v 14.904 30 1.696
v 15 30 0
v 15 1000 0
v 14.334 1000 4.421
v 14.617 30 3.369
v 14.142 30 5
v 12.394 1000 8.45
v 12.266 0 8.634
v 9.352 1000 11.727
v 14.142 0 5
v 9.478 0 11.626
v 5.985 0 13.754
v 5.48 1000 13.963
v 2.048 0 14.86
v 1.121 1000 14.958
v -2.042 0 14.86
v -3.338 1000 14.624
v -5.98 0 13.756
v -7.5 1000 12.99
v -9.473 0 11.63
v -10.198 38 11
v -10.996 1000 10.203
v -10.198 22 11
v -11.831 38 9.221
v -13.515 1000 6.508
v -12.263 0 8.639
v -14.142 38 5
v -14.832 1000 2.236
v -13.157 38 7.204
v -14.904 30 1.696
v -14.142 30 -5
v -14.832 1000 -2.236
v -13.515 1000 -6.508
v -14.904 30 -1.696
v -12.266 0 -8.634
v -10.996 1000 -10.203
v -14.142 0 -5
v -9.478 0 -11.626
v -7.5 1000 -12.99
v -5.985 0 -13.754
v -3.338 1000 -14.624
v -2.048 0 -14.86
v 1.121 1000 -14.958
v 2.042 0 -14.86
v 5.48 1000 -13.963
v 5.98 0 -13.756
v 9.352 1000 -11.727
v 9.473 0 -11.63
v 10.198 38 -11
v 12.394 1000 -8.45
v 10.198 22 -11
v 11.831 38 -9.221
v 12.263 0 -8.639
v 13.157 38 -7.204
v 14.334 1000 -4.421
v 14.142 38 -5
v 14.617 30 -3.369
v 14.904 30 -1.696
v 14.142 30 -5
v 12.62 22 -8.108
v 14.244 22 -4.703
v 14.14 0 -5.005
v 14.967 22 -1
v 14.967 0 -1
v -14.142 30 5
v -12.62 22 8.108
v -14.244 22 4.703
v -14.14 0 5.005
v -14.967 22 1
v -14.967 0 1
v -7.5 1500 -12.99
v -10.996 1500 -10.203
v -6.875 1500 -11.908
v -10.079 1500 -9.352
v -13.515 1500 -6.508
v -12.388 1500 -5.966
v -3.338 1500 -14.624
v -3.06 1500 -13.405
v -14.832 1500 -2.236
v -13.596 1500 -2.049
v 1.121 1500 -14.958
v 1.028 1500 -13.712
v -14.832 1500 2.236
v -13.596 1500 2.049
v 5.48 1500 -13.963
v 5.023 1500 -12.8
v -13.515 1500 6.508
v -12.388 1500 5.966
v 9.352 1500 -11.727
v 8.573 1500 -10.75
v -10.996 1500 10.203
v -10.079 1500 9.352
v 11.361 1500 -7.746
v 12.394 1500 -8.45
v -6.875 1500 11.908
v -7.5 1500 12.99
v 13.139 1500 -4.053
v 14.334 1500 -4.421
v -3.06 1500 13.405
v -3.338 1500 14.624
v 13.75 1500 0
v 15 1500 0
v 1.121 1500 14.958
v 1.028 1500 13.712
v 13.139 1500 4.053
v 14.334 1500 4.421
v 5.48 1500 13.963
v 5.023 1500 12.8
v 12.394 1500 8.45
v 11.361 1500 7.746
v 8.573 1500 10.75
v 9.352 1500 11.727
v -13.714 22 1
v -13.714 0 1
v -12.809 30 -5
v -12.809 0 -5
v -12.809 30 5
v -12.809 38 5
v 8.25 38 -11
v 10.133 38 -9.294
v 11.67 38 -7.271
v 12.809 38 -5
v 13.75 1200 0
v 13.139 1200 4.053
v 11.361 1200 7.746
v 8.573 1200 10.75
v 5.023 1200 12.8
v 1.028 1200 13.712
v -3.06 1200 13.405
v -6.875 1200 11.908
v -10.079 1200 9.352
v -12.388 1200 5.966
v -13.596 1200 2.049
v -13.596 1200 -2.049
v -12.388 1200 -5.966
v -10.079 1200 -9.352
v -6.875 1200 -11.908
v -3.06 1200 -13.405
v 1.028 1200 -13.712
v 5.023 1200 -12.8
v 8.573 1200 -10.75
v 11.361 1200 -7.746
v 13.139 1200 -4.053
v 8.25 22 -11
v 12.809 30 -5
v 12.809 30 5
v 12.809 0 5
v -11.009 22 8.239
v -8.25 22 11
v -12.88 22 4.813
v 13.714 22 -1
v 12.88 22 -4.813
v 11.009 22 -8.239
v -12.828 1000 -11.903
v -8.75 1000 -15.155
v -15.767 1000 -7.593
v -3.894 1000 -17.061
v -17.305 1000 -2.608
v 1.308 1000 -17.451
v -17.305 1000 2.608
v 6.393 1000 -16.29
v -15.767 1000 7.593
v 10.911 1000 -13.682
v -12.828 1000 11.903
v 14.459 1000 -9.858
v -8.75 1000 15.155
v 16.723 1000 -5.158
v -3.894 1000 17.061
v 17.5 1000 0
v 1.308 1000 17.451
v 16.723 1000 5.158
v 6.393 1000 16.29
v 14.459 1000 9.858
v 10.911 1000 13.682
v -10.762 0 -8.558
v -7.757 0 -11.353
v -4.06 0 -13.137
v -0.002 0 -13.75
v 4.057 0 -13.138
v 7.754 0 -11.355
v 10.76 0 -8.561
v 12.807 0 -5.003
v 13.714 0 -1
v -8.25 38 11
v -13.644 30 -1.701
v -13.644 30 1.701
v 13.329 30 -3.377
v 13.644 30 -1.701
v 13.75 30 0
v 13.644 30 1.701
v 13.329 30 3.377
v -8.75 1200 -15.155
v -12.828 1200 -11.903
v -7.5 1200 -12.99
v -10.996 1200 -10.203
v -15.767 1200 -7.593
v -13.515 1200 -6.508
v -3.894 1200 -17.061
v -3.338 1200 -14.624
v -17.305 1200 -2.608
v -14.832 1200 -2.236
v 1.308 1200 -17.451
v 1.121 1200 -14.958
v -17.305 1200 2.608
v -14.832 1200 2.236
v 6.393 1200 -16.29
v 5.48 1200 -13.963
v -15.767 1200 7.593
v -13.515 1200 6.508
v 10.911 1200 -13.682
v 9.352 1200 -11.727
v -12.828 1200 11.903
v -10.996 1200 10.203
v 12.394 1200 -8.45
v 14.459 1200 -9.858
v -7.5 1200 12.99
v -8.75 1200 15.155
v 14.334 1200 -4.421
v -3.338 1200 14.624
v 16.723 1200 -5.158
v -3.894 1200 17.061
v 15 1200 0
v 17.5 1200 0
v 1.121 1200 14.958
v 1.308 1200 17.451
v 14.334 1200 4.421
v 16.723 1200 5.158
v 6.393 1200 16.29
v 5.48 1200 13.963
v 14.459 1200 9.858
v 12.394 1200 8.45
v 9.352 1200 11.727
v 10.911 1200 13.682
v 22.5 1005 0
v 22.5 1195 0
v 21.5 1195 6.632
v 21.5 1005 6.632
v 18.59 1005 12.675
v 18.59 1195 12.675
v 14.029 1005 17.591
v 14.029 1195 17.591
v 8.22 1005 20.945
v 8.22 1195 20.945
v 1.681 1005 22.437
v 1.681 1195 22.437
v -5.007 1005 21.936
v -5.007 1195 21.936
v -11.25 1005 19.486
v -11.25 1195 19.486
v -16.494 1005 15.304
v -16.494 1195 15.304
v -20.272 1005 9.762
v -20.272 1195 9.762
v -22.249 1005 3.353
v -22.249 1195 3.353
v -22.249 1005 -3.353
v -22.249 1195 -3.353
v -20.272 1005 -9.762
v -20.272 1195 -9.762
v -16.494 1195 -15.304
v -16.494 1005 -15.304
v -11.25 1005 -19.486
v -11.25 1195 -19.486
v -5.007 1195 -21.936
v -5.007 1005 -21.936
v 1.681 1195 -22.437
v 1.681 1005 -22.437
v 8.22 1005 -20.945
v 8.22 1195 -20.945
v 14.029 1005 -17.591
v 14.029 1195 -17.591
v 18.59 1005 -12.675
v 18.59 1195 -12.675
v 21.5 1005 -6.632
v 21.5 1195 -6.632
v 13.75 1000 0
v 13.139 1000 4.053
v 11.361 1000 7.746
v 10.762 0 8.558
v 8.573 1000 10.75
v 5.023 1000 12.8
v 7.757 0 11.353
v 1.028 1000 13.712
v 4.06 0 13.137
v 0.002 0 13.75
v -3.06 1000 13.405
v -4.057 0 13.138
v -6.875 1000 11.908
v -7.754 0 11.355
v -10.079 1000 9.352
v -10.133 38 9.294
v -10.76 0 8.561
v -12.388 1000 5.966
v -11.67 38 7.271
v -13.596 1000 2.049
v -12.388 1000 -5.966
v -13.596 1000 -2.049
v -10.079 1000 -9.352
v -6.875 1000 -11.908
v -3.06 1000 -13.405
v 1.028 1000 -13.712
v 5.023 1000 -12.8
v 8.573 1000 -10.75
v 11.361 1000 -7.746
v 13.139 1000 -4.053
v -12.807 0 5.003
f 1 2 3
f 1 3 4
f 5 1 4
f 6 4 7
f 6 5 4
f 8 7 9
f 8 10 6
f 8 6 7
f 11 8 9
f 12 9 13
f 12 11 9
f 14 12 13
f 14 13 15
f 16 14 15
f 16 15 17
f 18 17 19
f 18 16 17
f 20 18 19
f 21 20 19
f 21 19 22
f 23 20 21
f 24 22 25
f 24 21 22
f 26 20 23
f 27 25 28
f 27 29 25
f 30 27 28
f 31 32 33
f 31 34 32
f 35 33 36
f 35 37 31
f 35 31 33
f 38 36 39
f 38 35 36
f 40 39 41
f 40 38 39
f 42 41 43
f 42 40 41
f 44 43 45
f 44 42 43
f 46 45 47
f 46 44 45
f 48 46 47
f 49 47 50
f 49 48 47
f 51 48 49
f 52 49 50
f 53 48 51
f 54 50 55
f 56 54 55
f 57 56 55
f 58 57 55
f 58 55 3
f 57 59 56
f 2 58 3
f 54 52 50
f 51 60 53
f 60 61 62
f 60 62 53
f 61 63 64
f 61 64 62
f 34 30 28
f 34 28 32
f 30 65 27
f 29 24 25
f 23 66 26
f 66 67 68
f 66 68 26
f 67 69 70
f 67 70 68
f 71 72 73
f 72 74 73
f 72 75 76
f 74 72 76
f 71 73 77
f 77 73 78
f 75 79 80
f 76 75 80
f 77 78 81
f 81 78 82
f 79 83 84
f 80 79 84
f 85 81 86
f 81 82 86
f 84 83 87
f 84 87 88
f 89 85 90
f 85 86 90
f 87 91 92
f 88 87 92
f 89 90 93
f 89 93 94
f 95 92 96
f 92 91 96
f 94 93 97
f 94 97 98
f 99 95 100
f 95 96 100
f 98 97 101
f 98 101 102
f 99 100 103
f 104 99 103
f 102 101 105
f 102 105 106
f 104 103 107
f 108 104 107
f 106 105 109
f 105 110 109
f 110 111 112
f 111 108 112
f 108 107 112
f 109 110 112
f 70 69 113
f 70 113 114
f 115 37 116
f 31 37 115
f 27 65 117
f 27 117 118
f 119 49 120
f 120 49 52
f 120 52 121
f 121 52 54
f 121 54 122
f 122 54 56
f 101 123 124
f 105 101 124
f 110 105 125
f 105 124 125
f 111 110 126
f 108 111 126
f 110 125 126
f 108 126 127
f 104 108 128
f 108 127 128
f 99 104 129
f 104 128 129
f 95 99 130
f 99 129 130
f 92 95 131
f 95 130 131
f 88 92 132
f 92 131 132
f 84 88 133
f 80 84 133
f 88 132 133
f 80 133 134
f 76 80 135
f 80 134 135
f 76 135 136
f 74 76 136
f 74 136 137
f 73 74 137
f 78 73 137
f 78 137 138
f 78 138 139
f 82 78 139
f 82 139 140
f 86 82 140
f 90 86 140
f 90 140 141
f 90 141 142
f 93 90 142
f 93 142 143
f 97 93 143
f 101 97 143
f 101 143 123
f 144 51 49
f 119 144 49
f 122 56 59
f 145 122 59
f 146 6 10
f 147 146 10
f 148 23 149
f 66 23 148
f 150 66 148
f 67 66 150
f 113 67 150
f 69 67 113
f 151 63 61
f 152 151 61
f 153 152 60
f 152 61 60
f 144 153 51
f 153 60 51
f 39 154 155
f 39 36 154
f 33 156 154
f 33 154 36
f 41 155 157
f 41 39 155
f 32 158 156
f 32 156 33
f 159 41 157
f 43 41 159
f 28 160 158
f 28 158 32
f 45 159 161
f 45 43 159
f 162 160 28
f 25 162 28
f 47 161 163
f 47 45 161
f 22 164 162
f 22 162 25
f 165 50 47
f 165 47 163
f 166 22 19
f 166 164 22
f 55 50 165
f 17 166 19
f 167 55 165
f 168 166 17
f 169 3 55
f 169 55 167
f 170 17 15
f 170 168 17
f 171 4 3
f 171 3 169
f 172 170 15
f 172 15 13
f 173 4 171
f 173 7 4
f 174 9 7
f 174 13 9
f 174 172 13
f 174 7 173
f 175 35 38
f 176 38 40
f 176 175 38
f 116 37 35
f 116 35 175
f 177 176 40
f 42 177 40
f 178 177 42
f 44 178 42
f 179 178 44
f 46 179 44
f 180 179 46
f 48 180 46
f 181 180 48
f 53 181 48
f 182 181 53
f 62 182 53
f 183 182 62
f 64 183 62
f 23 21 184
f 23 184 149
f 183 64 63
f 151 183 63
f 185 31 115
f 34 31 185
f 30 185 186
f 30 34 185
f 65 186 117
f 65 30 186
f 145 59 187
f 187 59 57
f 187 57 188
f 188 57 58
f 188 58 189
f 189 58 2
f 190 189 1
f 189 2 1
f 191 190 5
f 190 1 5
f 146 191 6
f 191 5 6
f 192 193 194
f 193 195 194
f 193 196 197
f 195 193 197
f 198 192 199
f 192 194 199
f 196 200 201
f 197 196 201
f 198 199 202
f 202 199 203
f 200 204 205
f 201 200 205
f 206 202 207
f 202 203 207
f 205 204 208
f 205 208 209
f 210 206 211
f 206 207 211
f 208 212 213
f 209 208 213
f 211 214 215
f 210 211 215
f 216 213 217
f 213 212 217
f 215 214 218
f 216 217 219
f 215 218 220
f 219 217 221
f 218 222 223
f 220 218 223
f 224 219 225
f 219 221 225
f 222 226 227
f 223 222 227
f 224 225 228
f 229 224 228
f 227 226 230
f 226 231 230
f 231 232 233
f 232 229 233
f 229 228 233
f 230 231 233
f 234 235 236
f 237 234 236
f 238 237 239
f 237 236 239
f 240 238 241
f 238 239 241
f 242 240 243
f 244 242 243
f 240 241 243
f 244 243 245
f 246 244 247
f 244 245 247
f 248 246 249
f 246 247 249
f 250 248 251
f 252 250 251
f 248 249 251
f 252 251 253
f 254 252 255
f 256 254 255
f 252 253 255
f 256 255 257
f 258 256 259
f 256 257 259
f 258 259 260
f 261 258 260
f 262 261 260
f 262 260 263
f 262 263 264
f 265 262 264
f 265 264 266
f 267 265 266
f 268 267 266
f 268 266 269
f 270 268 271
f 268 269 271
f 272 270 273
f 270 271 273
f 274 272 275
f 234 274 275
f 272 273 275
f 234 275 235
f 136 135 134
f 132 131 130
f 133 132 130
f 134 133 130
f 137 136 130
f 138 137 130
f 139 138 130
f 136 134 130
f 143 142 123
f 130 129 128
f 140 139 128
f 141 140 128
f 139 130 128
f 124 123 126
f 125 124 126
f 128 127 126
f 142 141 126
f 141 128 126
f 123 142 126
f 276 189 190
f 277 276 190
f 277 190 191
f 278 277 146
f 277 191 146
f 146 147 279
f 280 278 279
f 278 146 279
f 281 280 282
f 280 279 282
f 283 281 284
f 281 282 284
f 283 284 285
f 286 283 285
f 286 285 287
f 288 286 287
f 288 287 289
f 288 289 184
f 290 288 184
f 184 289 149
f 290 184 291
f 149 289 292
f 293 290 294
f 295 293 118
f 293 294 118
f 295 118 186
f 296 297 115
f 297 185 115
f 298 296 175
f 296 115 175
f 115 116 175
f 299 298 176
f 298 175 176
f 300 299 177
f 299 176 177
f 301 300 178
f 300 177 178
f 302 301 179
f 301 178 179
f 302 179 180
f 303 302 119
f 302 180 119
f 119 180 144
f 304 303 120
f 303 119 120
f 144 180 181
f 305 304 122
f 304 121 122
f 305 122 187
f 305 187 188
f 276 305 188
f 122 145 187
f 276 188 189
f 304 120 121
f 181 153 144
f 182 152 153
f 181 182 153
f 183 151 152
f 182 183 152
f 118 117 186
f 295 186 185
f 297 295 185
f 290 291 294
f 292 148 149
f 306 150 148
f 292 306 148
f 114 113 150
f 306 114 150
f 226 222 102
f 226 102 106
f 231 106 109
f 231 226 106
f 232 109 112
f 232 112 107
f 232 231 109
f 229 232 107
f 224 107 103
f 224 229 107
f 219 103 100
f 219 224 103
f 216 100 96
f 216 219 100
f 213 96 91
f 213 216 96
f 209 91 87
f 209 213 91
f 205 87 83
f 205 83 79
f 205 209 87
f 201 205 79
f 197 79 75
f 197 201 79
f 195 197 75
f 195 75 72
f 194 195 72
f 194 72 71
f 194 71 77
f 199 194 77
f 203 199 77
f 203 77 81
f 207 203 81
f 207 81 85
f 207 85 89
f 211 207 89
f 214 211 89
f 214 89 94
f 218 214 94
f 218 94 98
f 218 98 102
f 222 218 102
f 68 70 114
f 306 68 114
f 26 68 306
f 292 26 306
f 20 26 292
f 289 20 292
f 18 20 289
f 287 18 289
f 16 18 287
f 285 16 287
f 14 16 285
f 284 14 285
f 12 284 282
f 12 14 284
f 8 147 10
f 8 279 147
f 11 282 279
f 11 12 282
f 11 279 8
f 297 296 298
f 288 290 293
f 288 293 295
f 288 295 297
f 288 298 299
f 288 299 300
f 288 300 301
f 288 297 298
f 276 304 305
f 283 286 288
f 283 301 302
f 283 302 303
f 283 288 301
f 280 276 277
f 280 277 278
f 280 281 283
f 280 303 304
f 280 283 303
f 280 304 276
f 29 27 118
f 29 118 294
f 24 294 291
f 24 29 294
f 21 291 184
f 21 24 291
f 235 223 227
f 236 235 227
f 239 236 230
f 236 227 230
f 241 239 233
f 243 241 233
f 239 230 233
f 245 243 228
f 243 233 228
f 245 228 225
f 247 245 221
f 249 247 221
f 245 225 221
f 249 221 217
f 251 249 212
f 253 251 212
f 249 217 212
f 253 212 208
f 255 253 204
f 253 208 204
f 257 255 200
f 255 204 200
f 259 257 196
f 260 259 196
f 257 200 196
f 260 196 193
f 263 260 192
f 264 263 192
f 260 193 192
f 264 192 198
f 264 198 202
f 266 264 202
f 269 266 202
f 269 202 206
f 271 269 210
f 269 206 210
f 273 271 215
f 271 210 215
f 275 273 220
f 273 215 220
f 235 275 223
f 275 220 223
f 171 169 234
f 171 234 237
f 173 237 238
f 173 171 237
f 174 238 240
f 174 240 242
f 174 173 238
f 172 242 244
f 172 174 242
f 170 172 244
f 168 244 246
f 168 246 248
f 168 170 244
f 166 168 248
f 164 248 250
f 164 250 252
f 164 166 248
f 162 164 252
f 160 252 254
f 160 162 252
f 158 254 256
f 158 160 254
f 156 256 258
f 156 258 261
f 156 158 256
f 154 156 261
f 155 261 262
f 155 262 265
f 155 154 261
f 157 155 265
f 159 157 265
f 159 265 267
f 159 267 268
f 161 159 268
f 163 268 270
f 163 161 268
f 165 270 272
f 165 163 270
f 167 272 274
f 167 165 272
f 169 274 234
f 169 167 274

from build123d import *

# Parameters (mm, degrees)
F0_R      = 15
F1_DEPTH  = 1500
F2_R      = 13.75
F3_DEPTH  = 3000
F7_DEPTH  = 10
F9_DEPTH  = 10
F12_R     = 22.5
F13_DEPTH = 200
F14_SIZE  = 5


with BuildPart() as f1:
    # F0 (on Front) → F1 (new body)
    with BuildSketch(Plane.XZ):
        Circle(F0_R)
    extrude(amount=-F1_DEPTH)

    # F2 (on face) → F3 (cut)
    with BuildSketch(Plane.XZ):
        Circle(F2_R)
    extrude(amount=-F3_DEPTH, mode=Mode.SUBTRACT)

    # F6 (on offset) → F7 (cut)
    with BuildSketch(Plane.YZ.offset(15)):
        Polygon((30, 5), (0, 5), (0, -1), (22, -1), (22, -11), (38, -11), (38, -5), (30, -5), align=None)
    extrude(amount=-F7_DEPTH, mode=Mode.SUBTRACT)

    # F8 (on offset) → F9 (cut)
    with BuildSketch(Plane.YZ.offset(-15)):
        Polygon((22, 1), (0, 1), (0, -5), (30, -5), (30, 5), (38, 5), (38, 11), (22, 11), align=None)
    extrude(amount=F9_DEPTH, mode=Mode.SUBTRACT)

    # F12 (on offset) → F13 (join)
    with BuildSketch(Plane.XZ.offset(-1200)):
        Circle(F12_R)
    extrude(amount=F13_DEPTH)

    # F14
    f14_edges = [f1.edges().sort_by_distance(p)[0] for p in [
        (22.5, 1100, 0),
        (-22.5, 1200, 0),
        (-22.5, 1000, 0),
    ]]
    chamfer(f14_edges, length=F14_SIZE)


solid = f1.part
